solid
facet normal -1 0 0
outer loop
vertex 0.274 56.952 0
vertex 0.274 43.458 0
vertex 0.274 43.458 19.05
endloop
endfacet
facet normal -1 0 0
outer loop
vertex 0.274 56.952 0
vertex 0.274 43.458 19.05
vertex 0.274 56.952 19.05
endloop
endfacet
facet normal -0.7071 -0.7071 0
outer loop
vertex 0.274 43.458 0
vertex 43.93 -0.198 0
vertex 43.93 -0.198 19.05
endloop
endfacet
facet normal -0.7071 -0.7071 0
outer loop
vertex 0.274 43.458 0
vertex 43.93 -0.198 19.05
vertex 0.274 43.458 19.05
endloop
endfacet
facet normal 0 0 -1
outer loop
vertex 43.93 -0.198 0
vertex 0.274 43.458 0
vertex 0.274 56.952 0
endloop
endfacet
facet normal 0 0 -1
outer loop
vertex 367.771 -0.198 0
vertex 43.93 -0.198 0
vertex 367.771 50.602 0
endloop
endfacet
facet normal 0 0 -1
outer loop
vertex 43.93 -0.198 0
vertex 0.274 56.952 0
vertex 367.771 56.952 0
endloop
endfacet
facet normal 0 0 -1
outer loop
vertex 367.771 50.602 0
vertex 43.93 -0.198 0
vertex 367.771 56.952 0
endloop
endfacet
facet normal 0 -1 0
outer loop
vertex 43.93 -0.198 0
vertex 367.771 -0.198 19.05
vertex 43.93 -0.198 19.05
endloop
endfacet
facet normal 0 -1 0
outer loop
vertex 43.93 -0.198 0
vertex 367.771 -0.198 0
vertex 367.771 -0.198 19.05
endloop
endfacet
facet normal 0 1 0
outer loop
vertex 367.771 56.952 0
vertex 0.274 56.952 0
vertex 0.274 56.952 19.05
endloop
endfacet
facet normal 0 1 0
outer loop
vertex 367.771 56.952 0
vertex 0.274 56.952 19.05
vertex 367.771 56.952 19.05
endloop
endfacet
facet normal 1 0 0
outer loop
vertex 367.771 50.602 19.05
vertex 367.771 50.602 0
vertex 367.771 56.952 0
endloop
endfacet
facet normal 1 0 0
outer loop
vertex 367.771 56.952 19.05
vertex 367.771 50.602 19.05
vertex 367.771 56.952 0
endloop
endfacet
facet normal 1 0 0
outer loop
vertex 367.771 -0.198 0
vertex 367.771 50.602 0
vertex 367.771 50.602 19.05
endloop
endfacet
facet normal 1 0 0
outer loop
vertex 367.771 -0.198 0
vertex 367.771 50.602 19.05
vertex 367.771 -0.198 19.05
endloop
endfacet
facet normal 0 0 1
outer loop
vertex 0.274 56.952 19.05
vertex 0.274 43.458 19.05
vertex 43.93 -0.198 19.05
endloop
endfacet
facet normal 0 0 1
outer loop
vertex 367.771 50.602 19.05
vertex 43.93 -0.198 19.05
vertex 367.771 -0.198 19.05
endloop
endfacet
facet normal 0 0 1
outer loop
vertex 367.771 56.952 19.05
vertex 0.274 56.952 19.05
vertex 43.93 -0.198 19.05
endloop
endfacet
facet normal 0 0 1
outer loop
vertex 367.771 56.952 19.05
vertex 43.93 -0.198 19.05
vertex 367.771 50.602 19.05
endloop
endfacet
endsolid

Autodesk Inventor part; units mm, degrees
ref_plane "YZ Plane" through (0, 0, 0) normal (1, 0, 0) x (0, 1, 0)
ref_plane "XZ Plane" through (0, 0, 0) normal (0, 1, 0) x (-1, 0, 0)
ref_plane "XY Plane" through (0, 0, 0) normal (0, 0, 1) x (1, 0, 0)
sketch "Sketch1" plane through (0, 0, 0) normal (0, 0, 1) x (1, 0, 0)
  line L0 (367.7714, 50.6019) -> (367.7714, -0.1981)
  line L1 (367.7714, -0.1981) -> (367.7714, 56.9519)
  line L2 (367.7714, 56.9519) -> (367.7714, -0.1981)
  line L3 (367.7714, -0.1981) -> (43.93, -0.1981)
  line L4 (43.93, -0.1981) -> (0.2737, 43.4581)
  line L5 (0.2737, 43.4581) -> (0.2737, 56.9519)
  line L6 (0.2737, 56.9519) -> (367.7714, 56.9519)
  point P0 (0, 0)
extrude "Extrusion1" add sketch "Sketch1" along normal blind 19.05
properties part number "nd-17"
